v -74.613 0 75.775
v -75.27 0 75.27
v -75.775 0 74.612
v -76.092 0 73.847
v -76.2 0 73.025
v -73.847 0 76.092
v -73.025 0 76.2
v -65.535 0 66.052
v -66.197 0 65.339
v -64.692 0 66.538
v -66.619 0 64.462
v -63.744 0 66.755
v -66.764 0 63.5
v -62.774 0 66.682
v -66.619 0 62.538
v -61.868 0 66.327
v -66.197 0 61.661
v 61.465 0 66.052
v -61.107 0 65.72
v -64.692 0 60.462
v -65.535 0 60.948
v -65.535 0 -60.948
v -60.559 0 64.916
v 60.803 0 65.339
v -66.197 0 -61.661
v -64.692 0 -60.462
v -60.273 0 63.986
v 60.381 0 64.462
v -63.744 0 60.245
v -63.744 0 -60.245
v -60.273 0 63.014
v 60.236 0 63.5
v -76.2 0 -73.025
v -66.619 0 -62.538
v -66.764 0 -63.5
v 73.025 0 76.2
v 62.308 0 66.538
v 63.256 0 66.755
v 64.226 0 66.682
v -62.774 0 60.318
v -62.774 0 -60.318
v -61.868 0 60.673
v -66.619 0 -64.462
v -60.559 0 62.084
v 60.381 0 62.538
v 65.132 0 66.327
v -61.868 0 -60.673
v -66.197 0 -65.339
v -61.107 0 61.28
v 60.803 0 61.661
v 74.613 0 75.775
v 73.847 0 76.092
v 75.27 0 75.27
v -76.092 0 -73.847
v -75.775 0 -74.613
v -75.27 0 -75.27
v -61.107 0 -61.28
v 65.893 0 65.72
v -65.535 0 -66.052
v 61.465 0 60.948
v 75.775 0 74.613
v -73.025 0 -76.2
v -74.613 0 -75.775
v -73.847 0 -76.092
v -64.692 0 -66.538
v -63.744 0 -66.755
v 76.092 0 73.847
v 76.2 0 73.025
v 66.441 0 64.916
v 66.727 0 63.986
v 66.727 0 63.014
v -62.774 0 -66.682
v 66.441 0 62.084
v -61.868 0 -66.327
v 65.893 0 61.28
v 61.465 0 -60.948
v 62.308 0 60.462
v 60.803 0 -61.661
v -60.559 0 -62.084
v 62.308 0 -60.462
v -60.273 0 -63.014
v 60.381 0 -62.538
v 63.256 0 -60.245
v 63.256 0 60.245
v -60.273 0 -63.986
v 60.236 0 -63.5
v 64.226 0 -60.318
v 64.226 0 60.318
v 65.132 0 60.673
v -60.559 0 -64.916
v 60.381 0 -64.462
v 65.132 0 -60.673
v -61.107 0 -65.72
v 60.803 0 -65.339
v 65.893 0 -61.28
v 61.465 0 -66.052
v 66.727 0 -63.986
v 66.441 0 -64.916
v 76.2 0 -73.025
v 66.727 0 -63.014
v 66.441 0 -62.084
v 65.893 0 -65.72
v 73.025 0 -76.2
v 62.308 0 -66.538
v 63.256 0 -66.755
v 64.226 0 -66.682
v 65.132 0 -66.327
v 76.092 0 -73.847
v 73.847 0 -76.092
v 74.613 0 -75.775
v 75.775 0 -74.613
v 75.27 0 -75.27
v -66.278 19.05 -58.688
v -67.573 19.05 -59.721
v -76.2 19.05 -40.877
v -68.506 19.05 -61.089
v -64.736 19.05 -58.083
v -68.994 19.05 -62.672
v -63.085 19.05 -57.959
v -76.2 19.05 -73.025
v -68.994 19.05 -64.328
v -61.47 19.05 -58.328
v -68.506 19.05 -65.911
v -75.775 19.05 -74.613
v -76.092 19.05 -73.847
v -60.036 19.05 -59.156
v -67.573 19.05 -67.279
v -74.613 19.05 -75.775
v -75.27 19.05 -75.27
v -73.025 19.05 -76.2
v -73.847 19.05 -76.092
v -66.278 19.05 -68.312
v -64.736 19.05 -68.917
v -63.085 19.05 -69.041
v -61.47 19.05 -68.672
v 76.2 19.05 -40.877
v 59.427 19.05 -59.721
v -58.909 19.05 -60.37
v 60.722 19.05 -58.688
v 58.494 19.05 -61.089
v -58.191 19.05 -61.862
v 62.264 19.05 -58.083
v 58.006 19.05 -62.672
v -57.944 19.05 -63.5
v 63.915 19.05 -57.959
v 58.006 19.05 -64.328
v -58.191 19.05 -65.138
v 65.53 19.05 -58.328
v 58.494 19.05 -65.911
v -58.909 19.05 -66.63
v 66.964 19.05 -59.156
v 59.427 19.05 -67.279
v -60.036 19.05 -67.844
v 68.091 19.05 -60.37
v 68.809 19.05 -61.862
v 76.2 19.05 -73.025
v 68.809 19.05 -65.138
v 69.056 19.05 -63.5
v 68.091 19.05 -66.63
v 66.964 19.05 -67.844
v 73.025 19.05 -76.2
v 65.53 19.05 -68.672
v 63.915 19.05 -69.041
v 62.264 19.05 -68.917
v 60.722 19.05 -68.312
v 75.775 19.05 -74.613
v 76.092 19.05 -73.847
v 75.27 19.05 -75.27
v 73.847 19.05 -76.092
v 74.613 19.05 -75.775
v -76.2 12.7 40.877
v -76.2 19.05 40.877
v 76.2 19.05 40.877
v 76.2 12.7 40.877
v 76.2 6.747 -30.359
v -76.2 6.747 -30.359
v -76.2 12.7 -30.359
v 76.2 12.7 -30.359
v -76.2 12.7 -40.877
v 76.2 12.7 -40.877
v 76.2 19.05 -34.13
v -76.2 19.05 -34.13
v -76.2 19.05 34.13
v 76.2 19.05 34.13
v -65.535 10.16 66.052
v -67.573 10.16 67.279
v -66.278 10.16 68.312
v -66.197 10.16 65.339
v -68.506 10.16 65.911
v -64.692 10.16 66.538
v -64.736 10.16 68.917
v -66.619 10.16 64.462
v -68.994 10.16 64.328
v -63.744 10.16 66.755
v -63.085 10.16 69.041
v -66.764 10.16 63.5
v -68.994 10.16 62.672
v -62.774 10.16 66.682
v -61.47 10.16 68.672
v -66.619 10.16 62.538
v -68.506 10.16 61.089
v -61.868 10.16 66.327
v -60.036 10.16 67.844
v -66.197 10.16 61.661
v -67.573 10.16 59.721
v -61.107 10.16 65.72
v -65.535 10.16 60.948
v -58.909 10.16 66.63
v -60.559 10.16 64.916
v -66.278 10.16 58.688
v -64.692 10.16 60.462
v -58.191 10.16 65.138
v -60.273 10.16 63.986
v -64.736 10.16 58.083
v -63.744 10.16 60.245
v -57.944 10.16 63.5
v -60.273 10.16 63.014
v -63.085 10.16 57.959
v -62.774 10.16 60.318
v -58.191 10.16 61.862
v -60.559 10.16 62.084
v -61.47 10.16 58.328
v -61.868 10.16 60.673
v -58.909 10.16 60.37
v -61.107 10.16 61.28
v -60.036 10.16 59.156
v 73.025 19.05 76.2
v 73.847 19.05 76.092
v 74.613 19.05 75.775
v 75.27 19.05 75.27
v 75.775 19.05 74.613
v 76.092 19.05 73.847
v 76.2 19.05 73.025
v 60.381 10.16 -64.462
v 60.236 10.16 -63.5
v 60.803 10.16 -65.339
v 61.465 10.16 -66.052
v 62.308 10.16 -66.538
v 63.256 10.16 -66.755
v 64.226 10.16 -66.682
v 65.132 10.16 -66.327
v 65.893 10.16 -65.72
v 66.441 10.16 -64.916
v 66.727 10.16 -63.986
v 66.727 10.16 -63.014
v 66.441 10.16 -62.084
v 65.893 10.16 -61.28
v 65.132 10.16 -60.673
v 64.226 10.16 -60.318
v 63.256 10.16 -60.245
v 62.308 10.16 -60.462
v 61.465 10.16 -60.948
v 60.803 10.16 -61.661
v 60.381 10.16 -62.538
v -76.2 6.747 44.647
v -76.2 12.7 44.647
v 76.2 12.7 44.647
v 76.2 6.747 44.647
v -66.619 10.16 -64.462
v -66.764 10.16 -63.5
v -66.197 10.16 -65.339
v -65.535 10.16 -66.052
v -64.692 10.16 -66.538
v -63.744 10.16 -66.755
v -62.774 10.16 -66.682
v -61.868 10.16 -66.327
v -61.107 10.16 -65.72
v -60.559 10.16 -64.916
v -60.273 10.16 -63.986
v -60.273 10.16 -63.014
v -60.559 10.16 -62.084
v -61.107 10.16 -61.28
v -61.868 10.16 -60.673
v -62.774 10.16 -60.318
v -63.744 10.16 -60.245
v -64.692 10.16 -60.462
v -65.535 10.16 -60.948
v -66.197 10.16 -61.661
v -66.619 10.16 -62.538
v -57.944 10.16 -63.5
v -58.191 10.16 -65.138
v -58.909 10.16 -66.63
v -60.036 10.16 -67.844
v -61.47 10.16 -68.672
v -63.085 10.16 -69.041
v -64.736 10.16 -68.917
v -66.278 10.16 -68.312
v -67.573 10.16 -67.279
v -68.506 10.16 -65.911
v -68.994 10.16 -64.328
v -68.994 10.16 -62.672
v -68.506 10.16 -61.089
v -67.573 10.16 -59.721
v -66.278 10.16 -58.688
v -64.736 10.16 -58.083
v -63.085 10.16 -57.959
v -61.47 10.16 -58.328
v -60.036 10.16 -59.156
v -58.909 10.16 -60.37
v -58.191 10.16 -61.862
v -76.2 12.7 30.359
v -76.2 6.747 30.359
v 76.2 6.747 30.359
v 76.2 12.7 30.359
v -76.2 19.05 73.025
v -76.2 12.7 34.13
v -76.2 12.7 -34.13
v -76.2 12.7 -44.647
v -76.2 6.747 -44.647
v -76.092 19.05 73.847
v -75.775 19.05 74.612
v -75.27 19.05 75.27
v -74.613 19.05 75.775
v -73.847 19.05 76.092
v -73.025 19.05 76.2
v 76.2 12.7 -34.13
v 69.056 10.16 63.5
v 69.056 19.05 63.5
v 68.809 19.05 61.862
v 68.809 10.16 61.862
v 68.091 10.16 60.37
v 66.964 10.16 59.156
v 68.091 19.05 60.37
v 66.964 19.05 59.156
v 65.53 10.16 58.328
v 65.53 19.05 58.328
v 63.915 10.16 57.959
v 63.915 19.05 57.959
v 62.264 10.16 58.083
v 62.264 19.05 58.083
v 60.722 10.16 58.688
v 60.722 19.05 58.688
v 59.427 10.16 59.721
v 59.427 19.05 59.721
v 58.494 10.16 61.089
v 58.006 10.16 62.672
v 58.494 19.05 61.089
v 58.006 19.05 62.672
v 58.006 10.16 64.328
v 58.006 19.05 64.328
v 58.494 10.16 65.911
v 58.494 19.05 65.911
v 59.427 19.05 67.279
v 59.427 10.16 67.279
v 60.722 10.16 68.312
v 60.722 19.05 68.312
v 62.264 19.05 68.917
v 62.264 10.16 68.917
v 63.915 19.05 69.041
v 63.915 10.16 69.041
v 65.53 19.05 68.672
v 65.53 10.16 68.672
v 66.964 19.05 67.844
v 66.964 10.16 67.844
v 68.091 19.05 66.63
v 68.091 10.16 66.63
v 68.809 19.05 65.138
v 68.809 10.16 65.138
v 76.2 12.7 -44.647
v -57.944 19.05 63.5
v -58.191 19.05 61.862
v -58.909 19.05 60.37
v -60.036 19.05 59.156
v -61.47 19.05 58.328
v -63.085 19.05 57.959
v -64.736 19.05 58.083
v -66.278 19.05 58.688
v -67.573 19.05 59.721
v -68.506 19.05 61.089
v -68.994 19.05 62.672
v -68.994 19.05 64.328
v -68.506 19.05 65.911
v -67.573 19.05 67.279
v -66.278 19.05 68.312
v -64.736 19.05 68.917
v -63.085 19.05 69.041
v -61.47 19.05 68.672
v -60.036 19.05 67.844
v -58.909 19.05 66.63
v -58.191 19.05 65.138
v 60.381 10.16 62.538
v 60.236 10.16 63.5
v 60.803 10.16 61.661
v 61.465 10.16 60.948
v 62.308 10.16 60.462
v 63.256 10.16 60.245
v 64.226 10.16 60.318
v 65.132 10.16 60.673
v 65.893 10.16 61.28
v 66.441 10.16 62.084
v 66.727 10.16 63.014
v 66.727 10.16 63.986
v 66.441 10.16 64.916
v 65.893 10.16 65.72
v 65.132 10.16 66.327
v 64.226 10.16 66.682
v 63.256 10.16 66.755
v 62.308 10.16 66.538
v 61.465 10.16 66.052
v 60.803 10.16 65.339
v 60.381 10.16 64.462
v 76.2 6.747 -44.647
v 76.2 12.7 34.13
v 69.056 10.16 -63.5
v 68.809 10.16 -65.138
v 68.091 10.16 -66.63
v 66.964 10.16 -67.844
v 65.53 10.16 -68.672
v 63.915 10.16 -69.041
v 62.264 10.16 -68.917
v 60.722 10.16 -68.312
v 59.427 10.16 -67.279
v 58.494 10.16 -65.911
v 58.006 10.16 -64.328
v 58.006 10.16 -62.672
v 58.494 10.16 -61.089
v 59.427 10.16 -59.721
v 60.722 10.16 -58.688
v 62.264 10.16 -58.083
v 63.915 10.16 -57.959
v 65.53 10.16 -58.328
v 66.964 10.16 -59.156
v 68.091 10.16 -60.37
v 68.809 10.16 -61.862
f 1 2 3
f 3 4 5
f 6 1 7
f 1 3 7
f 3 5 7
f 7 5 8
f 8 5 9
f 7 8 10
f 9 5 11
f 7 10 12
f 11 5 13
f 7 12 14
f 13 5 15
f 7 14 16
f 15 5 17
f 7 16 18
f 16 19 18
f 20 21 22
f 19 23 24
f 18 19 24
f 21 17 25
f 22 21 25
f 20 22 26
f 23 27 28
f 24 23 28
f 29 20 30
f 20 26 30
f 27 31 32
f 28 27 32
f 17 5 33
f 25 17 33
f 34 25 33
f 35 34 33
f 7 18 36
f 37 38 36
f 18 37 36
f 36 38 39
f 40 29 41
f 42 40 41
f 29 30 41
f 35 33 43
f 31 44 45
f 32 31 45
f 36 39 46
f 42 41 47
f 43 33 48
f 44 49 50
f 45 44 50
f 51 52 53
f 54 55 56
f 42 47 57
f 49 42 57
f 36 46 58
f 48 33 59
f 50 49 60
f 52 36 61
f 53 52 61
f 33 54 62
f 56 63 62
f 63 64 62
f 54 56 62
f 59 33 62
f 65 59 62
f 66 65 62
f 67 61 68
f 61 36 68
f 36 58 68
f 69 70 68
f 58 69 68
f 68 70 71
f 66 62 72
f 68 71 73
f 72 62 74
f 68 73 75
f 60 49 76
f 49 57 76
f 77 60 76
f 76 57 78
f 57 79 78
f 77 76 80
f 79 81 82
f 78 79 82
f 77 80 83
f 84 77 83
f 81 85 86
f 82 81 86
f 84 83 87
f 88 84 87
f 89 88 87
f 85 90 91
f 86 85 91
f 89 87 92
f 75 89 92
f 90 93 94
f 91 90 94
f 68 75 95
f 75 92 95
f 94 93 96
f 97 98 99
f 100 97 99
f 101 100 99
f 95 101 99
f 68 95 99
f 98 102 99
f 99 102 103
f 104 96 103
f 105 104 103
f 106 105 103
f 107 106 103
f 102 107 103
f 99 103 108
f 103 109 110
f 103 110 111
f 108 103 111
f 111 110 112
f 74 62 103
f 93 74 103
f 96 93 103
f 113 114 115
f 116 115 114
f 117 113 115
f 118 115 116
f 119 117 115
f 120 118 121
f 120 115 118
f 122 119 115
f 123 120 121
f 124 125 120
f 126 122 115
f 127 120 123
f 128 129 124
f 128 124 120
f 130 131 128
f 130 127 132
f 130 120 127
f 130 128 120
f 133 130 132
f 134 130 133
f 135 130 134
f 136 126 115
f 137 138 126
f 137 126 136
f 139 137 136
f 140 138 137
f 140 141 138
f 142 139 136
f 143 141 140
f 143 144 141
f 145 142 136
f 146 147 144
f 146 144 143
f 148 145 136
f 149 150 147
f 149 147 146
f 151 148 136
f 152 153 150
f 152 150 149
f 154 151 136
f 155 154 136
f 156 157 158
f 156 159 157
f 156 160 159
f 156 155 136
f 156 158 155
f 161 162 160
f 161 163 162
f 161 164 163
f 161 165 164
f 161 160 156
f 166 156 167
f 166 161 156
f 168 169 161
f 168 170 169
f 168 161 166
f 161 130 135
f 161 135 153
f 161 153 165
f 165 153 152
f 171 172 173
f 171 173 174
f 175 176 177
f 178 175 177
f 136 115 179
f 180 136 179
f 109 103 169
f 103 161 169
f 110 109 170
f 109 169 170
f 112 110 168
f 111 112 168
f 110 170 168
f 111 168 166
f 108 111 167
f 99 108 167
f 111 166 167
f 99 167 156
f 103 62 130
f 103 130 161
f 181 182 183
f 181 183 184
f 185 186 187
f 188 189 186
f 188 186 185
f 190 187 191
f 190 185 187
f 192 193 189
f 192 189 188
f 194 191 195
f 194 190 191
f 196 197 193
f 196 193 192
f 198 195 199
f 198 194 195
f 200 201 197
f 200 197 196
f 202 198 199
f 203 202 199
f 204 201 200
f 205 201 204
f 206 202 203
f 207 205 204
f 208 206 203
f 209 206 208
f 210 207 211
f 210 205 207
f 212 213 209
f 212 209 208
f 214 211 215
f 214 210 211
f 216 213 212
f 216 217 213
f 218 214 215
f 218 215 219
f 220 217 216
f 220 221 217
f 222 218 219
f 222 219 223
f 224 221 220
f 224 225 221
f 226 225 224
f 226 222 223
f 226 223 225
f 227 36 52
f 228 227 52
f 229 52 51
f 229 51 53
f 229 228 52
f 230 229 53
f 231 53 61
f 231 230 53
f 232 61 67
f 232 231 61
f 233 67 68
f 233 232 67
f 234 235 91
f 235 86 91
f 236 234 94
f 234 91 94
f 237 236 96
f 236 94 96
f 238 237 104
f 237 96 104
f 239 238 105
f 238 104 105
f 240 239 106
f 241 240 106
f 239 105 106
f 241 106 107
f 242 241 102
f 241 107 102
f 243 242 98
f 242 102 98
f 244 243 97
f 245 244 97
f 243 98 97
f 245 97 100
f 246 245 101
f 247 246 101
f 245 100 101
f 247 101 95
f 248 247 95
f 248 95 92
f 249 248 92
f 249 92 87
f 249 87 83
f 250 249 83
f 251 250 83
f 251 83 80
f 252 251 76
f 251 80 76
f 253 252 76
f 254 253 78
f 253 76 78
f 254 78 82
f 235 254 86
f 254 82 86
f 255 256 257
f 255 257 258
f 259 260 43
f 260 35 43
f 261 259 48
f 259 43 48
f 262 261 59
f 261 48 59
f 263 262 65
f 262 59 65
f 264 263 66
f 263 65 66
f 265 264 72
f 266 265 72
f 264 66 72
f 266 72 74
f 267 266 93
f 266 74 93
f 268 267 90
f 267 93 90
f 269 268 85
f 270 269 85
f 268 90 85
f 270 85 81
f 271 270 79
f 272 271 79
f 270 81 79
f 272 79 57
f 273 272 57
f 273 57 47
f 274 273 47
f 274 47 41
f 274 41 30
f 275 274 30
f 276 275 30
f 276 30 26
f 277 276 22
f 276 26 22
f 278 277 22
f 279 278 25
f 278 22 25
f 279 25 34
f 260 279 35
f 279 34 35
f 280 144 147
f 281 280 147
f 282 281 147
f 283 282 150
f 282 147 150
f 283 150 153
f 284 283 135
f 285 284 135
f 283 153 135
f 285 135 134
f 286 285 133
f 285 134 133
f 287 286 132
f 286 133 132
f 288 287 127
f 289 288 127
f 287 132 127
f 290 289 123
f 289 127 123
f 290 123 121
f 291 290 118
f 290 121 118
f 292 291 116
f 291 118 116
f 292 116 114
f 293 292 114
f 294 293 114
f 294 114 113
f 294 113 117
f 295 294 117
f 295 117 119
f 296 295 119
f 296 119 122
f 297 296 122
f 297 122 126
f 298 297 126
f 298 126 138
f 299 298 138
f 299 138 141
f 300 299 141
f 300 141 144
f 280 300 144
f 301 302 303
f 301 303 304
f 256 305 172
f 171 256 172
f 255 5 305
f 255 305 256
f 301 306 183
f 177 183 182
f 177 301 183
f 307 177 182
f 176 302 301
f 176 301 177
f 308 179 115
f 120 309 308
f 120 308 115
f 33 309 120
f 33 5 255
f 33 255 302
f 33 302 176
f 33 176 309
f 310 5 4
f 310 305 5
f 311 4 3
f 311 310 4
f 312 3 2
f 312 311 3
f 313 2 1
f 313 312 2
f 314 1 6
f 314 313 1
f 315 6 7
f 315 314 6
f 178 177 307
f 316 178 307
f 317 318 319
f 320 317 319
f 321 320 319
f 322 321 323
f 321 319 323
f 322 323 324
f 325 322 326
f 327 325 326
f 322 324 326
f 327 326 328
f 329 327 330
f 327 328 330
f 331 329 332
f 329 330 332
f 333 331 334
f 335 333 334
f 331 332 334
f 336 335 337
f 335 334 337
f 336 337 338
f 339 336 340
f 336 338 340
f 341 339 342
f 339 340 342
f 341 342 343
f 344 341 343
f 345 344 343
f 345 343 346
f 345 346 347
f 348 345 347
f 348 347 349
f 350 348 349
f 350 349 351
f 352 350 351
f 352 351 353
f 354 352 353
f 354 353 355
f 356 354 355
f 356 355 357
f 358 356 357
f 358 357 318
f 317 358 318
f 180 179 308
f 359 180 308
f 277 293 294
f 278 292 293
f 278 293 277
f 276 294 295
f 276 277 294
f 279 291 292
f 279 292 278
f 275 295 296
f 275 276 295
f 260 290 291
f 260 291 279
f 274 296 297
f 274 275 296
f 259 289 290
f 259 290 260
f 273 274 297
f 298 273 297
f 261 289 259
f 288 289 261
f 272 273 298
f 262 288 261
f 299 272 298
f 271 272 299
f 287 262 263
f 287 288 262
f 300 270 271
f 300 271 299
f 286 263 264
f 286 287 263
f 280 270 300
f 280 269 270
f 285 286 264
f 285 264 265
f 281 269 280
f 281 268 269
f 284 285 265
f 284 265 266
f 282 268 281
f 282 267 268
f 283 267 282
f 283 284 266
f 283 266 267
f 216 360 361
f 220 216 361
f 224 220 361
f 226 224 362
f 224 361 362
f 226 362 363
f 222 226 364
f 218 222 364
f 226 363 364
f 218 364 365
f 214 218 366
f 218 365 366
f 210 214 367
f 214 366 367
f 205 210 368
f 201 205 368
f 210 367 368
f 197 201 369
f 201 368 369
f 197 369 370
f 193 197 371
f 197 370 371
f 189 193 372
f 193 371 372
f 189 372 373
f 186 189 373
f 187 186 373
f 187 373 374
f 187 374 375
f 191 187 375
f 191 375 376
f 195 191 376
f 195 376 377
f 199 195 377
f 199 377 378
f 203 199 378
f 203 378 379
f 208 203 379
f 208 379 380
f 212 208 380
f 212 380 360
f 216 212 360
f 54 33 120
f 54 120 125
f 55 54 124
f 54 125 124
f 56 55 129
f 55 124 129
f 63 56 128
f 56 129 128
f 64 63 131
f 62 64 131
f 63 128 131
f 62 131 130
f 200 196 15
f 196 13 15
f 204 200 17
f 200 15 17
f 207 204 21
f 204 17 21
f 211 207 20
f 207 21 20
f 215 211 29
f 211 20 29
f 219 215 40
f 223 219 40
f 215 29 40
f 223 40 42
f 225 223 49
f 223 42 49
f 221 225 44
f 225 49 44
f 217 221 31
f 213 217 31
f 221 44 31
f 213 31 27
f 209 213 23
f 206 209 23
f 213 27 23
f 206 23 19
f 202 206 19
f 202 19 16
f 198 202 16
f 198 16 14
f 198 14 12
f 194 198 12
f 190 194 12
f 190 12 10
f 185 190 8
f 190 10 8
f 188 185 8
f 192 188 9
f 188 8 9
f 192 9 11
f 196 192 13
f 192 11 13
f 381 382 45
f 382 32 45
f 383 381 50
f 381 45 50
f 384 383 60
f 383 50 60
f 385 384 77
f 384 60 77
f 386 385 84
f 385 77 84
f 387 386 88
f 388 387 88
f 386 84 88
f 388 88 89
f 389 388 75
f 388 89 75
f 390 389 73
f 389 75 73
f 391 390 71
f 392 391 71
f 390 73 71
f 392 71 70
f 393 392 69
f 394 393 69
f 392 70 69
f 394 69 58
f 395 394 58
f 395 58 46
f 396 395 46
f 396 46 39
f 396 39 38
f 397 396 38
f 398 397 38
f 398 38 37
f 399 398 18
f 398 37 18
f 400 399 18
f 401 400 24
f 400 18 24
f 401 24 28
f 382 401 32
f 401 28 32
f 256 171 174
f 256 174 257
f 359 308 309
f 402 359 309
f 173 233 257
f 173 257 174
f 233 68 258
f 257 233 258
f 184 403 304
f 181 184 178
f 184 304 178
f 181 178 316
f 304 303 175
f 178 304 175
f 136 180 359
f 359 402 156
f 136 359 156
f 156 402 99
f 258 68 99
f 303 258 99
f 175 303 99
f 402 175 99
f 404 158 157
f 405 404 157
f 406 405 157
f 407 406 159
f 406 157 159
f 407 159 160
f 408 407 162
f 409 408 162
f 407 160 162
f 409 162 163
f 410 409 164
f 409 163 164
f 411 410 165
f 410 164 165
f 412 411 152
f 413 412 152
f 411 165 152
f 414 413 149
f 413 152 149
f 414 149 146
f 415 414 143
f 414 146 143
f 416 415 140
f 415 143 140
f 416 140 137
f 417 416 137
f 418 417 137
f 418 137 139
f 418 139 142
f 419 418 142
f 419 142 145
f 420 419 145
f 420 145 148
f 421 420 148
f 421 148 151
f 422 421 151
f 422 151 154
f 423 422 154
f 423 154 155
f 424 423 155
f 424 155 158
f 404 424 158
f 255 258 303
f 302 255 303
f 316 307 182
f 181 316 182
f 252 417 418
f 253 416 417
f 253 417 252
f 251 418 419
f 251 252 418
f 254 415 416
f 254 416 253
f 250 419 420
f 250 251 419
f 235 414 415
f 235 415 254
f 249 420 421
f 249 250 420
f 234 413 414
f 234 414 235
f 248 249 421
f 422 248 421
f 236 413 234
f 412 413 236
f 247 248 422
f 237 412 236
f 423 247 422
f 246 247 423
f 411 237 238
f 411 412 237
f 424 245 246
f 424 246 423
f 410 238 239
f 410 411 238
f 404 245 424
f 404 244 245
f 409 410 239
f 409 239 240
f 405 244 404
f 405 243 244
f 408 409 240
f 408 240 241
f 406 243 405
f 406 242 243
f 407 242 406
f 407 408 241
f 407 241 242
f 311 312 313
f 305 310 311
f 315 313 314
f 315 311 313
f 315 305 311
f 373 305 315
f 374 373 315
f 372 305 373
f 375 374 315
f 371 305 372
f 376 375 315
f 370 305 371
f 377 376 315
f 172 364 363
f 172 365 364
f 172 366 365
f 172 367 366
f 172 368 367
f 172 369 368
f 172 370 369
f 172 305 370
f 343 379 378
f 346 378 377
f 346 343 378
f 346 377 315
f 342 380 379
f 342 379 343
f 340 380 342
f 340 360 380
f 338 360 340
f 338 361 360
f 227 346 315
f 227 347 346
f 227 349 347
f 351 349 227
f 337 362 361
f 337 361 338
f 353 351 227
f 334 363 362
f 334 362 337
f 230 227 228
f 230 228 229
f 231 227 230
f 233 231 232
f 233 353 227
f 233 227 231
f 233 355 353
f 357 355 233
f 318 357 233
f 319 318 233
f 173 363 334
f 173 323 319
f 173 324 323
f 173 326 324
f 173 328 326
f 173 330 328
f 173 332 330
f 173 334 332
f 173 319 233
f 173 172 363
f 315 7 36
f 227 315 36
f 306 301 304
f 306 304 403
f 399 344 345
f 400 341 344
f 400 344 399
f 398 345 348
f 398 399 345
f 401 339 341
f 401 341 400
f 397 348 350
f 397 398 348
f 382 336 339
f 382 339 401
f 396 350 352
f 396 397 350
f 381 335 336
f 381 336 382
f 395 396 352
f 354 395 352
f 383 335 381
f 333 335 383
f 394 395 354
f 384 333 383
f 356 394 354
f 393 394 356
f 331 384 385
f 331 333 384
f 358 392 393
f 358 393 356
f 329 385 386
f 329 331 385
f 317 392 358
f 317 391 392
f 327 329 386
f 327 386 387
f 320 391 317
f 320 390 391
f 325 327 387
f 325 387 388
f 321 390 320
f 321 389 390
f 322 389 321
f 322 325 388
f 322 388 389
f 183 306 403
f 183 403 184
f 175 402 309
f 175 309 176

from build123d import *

# Parameters (mm, degrees)
SKETCH1_W                                        = 152.4
SKETCH1_H                                        = 152.4
BOSS_EXTRUDE1_DEPTH                              = 19.05
CBORE_FOR_1_4_SOCKET_HEAD_CAP_SCREW1_D           = 6.5278
CBORE_FOR_1_4_SOCKET_HEAD_CAP_SCREW1_CBORE_D     = 11.1125
CBORE_FOR_1_4_SOCKET_HEAD_CAP_SCREW1_CBORE_DEPTH = 8.89
T_SLOT_CUT_WITH_MCMASTER_8789A16_BIT_DEPTH       = 172.45
FILLET1_R                                        = 3.175


with BuildPart() as part:
    # Sketch1 → Boss-Extrude1 (new body)
    with BuildSketch(Plane(origin=(0, 0, 0), x_dir=(1, 0, 0), z_dir=(0, 1, 0))):
        Rectangle(SKETCH1_W, SKETCH1_H)
    extrude(amount=BOSS_EXTRUDE1_DEPTH)

    # CBORE for 1/4 Socket Head Cap Screw1 (through all)
    with Locations(Plane(origin=(0, 19.05, 0), x_dir=(1, 0, 0), z_dir=(0, 1, 0))):
        with Locations((-63.5, 63.5), (63.5, 63.5), (63.5, -63.5), (-63.5, -63.5)):
            CounterBoreHole(CBORE_FOR_1_4_SOCKET_HEAD_CAP_SCREW1_D / 2, CBORE_FOR_1_4_SOCKET_HEAD_CAP_SCREW1_CBORE_D / 2, CBORE_FOR_1_4_SOCKET_HEAD_CAP_SCREW1_CBORE_DEPTH)

    # Sketch4 → T-SLOT CUT WITH MCMASTER 8789A16 BIT (cut, through all)
    with BuildSketch(Plane(origin=(-76.2, 0, 0), x_dir=(0, 0, -1), z_dir=(1, 0, 0))):
        Polygon((-40.8765375, 19.05), (-40.8765375, 12.7), (-44.64685, 12.7), (-44.64685, 6.746875), (-30.35935, 6.746875), (-30.35935, 12.7), (-34.1296625, 12.7), (-34.1296625, 19.05), align=None)
        Polygon((34.1296625, 12.7), (34.1296625, 19.05), (40.8765375, 19.05), (40.8765375, 12.7), (44.64685, 12.7), (44.64685, 6.746875), (30.35935, 6.746875), (30.35935, 12.7), align=None)
    extrude(amount=T_SLOT_CUT_WITH_MCMASTER_8789A16_BIT_DEPTH, mode=Mode.SUBTRACT)

    # Fillet1
    fillet1_edges = [part.edges().sort_by_distance(p)[0] for p in [
        (76.2, 9.525, 76.2),
        (-76.2, 9.525, 76.2),
        (-76.2, 9.525, -76.2),
        (76.2, 9.525, -76.2),
    ]]
    fillet(fillet1_edges, radius=FILLET1_R)


solid = part.part
